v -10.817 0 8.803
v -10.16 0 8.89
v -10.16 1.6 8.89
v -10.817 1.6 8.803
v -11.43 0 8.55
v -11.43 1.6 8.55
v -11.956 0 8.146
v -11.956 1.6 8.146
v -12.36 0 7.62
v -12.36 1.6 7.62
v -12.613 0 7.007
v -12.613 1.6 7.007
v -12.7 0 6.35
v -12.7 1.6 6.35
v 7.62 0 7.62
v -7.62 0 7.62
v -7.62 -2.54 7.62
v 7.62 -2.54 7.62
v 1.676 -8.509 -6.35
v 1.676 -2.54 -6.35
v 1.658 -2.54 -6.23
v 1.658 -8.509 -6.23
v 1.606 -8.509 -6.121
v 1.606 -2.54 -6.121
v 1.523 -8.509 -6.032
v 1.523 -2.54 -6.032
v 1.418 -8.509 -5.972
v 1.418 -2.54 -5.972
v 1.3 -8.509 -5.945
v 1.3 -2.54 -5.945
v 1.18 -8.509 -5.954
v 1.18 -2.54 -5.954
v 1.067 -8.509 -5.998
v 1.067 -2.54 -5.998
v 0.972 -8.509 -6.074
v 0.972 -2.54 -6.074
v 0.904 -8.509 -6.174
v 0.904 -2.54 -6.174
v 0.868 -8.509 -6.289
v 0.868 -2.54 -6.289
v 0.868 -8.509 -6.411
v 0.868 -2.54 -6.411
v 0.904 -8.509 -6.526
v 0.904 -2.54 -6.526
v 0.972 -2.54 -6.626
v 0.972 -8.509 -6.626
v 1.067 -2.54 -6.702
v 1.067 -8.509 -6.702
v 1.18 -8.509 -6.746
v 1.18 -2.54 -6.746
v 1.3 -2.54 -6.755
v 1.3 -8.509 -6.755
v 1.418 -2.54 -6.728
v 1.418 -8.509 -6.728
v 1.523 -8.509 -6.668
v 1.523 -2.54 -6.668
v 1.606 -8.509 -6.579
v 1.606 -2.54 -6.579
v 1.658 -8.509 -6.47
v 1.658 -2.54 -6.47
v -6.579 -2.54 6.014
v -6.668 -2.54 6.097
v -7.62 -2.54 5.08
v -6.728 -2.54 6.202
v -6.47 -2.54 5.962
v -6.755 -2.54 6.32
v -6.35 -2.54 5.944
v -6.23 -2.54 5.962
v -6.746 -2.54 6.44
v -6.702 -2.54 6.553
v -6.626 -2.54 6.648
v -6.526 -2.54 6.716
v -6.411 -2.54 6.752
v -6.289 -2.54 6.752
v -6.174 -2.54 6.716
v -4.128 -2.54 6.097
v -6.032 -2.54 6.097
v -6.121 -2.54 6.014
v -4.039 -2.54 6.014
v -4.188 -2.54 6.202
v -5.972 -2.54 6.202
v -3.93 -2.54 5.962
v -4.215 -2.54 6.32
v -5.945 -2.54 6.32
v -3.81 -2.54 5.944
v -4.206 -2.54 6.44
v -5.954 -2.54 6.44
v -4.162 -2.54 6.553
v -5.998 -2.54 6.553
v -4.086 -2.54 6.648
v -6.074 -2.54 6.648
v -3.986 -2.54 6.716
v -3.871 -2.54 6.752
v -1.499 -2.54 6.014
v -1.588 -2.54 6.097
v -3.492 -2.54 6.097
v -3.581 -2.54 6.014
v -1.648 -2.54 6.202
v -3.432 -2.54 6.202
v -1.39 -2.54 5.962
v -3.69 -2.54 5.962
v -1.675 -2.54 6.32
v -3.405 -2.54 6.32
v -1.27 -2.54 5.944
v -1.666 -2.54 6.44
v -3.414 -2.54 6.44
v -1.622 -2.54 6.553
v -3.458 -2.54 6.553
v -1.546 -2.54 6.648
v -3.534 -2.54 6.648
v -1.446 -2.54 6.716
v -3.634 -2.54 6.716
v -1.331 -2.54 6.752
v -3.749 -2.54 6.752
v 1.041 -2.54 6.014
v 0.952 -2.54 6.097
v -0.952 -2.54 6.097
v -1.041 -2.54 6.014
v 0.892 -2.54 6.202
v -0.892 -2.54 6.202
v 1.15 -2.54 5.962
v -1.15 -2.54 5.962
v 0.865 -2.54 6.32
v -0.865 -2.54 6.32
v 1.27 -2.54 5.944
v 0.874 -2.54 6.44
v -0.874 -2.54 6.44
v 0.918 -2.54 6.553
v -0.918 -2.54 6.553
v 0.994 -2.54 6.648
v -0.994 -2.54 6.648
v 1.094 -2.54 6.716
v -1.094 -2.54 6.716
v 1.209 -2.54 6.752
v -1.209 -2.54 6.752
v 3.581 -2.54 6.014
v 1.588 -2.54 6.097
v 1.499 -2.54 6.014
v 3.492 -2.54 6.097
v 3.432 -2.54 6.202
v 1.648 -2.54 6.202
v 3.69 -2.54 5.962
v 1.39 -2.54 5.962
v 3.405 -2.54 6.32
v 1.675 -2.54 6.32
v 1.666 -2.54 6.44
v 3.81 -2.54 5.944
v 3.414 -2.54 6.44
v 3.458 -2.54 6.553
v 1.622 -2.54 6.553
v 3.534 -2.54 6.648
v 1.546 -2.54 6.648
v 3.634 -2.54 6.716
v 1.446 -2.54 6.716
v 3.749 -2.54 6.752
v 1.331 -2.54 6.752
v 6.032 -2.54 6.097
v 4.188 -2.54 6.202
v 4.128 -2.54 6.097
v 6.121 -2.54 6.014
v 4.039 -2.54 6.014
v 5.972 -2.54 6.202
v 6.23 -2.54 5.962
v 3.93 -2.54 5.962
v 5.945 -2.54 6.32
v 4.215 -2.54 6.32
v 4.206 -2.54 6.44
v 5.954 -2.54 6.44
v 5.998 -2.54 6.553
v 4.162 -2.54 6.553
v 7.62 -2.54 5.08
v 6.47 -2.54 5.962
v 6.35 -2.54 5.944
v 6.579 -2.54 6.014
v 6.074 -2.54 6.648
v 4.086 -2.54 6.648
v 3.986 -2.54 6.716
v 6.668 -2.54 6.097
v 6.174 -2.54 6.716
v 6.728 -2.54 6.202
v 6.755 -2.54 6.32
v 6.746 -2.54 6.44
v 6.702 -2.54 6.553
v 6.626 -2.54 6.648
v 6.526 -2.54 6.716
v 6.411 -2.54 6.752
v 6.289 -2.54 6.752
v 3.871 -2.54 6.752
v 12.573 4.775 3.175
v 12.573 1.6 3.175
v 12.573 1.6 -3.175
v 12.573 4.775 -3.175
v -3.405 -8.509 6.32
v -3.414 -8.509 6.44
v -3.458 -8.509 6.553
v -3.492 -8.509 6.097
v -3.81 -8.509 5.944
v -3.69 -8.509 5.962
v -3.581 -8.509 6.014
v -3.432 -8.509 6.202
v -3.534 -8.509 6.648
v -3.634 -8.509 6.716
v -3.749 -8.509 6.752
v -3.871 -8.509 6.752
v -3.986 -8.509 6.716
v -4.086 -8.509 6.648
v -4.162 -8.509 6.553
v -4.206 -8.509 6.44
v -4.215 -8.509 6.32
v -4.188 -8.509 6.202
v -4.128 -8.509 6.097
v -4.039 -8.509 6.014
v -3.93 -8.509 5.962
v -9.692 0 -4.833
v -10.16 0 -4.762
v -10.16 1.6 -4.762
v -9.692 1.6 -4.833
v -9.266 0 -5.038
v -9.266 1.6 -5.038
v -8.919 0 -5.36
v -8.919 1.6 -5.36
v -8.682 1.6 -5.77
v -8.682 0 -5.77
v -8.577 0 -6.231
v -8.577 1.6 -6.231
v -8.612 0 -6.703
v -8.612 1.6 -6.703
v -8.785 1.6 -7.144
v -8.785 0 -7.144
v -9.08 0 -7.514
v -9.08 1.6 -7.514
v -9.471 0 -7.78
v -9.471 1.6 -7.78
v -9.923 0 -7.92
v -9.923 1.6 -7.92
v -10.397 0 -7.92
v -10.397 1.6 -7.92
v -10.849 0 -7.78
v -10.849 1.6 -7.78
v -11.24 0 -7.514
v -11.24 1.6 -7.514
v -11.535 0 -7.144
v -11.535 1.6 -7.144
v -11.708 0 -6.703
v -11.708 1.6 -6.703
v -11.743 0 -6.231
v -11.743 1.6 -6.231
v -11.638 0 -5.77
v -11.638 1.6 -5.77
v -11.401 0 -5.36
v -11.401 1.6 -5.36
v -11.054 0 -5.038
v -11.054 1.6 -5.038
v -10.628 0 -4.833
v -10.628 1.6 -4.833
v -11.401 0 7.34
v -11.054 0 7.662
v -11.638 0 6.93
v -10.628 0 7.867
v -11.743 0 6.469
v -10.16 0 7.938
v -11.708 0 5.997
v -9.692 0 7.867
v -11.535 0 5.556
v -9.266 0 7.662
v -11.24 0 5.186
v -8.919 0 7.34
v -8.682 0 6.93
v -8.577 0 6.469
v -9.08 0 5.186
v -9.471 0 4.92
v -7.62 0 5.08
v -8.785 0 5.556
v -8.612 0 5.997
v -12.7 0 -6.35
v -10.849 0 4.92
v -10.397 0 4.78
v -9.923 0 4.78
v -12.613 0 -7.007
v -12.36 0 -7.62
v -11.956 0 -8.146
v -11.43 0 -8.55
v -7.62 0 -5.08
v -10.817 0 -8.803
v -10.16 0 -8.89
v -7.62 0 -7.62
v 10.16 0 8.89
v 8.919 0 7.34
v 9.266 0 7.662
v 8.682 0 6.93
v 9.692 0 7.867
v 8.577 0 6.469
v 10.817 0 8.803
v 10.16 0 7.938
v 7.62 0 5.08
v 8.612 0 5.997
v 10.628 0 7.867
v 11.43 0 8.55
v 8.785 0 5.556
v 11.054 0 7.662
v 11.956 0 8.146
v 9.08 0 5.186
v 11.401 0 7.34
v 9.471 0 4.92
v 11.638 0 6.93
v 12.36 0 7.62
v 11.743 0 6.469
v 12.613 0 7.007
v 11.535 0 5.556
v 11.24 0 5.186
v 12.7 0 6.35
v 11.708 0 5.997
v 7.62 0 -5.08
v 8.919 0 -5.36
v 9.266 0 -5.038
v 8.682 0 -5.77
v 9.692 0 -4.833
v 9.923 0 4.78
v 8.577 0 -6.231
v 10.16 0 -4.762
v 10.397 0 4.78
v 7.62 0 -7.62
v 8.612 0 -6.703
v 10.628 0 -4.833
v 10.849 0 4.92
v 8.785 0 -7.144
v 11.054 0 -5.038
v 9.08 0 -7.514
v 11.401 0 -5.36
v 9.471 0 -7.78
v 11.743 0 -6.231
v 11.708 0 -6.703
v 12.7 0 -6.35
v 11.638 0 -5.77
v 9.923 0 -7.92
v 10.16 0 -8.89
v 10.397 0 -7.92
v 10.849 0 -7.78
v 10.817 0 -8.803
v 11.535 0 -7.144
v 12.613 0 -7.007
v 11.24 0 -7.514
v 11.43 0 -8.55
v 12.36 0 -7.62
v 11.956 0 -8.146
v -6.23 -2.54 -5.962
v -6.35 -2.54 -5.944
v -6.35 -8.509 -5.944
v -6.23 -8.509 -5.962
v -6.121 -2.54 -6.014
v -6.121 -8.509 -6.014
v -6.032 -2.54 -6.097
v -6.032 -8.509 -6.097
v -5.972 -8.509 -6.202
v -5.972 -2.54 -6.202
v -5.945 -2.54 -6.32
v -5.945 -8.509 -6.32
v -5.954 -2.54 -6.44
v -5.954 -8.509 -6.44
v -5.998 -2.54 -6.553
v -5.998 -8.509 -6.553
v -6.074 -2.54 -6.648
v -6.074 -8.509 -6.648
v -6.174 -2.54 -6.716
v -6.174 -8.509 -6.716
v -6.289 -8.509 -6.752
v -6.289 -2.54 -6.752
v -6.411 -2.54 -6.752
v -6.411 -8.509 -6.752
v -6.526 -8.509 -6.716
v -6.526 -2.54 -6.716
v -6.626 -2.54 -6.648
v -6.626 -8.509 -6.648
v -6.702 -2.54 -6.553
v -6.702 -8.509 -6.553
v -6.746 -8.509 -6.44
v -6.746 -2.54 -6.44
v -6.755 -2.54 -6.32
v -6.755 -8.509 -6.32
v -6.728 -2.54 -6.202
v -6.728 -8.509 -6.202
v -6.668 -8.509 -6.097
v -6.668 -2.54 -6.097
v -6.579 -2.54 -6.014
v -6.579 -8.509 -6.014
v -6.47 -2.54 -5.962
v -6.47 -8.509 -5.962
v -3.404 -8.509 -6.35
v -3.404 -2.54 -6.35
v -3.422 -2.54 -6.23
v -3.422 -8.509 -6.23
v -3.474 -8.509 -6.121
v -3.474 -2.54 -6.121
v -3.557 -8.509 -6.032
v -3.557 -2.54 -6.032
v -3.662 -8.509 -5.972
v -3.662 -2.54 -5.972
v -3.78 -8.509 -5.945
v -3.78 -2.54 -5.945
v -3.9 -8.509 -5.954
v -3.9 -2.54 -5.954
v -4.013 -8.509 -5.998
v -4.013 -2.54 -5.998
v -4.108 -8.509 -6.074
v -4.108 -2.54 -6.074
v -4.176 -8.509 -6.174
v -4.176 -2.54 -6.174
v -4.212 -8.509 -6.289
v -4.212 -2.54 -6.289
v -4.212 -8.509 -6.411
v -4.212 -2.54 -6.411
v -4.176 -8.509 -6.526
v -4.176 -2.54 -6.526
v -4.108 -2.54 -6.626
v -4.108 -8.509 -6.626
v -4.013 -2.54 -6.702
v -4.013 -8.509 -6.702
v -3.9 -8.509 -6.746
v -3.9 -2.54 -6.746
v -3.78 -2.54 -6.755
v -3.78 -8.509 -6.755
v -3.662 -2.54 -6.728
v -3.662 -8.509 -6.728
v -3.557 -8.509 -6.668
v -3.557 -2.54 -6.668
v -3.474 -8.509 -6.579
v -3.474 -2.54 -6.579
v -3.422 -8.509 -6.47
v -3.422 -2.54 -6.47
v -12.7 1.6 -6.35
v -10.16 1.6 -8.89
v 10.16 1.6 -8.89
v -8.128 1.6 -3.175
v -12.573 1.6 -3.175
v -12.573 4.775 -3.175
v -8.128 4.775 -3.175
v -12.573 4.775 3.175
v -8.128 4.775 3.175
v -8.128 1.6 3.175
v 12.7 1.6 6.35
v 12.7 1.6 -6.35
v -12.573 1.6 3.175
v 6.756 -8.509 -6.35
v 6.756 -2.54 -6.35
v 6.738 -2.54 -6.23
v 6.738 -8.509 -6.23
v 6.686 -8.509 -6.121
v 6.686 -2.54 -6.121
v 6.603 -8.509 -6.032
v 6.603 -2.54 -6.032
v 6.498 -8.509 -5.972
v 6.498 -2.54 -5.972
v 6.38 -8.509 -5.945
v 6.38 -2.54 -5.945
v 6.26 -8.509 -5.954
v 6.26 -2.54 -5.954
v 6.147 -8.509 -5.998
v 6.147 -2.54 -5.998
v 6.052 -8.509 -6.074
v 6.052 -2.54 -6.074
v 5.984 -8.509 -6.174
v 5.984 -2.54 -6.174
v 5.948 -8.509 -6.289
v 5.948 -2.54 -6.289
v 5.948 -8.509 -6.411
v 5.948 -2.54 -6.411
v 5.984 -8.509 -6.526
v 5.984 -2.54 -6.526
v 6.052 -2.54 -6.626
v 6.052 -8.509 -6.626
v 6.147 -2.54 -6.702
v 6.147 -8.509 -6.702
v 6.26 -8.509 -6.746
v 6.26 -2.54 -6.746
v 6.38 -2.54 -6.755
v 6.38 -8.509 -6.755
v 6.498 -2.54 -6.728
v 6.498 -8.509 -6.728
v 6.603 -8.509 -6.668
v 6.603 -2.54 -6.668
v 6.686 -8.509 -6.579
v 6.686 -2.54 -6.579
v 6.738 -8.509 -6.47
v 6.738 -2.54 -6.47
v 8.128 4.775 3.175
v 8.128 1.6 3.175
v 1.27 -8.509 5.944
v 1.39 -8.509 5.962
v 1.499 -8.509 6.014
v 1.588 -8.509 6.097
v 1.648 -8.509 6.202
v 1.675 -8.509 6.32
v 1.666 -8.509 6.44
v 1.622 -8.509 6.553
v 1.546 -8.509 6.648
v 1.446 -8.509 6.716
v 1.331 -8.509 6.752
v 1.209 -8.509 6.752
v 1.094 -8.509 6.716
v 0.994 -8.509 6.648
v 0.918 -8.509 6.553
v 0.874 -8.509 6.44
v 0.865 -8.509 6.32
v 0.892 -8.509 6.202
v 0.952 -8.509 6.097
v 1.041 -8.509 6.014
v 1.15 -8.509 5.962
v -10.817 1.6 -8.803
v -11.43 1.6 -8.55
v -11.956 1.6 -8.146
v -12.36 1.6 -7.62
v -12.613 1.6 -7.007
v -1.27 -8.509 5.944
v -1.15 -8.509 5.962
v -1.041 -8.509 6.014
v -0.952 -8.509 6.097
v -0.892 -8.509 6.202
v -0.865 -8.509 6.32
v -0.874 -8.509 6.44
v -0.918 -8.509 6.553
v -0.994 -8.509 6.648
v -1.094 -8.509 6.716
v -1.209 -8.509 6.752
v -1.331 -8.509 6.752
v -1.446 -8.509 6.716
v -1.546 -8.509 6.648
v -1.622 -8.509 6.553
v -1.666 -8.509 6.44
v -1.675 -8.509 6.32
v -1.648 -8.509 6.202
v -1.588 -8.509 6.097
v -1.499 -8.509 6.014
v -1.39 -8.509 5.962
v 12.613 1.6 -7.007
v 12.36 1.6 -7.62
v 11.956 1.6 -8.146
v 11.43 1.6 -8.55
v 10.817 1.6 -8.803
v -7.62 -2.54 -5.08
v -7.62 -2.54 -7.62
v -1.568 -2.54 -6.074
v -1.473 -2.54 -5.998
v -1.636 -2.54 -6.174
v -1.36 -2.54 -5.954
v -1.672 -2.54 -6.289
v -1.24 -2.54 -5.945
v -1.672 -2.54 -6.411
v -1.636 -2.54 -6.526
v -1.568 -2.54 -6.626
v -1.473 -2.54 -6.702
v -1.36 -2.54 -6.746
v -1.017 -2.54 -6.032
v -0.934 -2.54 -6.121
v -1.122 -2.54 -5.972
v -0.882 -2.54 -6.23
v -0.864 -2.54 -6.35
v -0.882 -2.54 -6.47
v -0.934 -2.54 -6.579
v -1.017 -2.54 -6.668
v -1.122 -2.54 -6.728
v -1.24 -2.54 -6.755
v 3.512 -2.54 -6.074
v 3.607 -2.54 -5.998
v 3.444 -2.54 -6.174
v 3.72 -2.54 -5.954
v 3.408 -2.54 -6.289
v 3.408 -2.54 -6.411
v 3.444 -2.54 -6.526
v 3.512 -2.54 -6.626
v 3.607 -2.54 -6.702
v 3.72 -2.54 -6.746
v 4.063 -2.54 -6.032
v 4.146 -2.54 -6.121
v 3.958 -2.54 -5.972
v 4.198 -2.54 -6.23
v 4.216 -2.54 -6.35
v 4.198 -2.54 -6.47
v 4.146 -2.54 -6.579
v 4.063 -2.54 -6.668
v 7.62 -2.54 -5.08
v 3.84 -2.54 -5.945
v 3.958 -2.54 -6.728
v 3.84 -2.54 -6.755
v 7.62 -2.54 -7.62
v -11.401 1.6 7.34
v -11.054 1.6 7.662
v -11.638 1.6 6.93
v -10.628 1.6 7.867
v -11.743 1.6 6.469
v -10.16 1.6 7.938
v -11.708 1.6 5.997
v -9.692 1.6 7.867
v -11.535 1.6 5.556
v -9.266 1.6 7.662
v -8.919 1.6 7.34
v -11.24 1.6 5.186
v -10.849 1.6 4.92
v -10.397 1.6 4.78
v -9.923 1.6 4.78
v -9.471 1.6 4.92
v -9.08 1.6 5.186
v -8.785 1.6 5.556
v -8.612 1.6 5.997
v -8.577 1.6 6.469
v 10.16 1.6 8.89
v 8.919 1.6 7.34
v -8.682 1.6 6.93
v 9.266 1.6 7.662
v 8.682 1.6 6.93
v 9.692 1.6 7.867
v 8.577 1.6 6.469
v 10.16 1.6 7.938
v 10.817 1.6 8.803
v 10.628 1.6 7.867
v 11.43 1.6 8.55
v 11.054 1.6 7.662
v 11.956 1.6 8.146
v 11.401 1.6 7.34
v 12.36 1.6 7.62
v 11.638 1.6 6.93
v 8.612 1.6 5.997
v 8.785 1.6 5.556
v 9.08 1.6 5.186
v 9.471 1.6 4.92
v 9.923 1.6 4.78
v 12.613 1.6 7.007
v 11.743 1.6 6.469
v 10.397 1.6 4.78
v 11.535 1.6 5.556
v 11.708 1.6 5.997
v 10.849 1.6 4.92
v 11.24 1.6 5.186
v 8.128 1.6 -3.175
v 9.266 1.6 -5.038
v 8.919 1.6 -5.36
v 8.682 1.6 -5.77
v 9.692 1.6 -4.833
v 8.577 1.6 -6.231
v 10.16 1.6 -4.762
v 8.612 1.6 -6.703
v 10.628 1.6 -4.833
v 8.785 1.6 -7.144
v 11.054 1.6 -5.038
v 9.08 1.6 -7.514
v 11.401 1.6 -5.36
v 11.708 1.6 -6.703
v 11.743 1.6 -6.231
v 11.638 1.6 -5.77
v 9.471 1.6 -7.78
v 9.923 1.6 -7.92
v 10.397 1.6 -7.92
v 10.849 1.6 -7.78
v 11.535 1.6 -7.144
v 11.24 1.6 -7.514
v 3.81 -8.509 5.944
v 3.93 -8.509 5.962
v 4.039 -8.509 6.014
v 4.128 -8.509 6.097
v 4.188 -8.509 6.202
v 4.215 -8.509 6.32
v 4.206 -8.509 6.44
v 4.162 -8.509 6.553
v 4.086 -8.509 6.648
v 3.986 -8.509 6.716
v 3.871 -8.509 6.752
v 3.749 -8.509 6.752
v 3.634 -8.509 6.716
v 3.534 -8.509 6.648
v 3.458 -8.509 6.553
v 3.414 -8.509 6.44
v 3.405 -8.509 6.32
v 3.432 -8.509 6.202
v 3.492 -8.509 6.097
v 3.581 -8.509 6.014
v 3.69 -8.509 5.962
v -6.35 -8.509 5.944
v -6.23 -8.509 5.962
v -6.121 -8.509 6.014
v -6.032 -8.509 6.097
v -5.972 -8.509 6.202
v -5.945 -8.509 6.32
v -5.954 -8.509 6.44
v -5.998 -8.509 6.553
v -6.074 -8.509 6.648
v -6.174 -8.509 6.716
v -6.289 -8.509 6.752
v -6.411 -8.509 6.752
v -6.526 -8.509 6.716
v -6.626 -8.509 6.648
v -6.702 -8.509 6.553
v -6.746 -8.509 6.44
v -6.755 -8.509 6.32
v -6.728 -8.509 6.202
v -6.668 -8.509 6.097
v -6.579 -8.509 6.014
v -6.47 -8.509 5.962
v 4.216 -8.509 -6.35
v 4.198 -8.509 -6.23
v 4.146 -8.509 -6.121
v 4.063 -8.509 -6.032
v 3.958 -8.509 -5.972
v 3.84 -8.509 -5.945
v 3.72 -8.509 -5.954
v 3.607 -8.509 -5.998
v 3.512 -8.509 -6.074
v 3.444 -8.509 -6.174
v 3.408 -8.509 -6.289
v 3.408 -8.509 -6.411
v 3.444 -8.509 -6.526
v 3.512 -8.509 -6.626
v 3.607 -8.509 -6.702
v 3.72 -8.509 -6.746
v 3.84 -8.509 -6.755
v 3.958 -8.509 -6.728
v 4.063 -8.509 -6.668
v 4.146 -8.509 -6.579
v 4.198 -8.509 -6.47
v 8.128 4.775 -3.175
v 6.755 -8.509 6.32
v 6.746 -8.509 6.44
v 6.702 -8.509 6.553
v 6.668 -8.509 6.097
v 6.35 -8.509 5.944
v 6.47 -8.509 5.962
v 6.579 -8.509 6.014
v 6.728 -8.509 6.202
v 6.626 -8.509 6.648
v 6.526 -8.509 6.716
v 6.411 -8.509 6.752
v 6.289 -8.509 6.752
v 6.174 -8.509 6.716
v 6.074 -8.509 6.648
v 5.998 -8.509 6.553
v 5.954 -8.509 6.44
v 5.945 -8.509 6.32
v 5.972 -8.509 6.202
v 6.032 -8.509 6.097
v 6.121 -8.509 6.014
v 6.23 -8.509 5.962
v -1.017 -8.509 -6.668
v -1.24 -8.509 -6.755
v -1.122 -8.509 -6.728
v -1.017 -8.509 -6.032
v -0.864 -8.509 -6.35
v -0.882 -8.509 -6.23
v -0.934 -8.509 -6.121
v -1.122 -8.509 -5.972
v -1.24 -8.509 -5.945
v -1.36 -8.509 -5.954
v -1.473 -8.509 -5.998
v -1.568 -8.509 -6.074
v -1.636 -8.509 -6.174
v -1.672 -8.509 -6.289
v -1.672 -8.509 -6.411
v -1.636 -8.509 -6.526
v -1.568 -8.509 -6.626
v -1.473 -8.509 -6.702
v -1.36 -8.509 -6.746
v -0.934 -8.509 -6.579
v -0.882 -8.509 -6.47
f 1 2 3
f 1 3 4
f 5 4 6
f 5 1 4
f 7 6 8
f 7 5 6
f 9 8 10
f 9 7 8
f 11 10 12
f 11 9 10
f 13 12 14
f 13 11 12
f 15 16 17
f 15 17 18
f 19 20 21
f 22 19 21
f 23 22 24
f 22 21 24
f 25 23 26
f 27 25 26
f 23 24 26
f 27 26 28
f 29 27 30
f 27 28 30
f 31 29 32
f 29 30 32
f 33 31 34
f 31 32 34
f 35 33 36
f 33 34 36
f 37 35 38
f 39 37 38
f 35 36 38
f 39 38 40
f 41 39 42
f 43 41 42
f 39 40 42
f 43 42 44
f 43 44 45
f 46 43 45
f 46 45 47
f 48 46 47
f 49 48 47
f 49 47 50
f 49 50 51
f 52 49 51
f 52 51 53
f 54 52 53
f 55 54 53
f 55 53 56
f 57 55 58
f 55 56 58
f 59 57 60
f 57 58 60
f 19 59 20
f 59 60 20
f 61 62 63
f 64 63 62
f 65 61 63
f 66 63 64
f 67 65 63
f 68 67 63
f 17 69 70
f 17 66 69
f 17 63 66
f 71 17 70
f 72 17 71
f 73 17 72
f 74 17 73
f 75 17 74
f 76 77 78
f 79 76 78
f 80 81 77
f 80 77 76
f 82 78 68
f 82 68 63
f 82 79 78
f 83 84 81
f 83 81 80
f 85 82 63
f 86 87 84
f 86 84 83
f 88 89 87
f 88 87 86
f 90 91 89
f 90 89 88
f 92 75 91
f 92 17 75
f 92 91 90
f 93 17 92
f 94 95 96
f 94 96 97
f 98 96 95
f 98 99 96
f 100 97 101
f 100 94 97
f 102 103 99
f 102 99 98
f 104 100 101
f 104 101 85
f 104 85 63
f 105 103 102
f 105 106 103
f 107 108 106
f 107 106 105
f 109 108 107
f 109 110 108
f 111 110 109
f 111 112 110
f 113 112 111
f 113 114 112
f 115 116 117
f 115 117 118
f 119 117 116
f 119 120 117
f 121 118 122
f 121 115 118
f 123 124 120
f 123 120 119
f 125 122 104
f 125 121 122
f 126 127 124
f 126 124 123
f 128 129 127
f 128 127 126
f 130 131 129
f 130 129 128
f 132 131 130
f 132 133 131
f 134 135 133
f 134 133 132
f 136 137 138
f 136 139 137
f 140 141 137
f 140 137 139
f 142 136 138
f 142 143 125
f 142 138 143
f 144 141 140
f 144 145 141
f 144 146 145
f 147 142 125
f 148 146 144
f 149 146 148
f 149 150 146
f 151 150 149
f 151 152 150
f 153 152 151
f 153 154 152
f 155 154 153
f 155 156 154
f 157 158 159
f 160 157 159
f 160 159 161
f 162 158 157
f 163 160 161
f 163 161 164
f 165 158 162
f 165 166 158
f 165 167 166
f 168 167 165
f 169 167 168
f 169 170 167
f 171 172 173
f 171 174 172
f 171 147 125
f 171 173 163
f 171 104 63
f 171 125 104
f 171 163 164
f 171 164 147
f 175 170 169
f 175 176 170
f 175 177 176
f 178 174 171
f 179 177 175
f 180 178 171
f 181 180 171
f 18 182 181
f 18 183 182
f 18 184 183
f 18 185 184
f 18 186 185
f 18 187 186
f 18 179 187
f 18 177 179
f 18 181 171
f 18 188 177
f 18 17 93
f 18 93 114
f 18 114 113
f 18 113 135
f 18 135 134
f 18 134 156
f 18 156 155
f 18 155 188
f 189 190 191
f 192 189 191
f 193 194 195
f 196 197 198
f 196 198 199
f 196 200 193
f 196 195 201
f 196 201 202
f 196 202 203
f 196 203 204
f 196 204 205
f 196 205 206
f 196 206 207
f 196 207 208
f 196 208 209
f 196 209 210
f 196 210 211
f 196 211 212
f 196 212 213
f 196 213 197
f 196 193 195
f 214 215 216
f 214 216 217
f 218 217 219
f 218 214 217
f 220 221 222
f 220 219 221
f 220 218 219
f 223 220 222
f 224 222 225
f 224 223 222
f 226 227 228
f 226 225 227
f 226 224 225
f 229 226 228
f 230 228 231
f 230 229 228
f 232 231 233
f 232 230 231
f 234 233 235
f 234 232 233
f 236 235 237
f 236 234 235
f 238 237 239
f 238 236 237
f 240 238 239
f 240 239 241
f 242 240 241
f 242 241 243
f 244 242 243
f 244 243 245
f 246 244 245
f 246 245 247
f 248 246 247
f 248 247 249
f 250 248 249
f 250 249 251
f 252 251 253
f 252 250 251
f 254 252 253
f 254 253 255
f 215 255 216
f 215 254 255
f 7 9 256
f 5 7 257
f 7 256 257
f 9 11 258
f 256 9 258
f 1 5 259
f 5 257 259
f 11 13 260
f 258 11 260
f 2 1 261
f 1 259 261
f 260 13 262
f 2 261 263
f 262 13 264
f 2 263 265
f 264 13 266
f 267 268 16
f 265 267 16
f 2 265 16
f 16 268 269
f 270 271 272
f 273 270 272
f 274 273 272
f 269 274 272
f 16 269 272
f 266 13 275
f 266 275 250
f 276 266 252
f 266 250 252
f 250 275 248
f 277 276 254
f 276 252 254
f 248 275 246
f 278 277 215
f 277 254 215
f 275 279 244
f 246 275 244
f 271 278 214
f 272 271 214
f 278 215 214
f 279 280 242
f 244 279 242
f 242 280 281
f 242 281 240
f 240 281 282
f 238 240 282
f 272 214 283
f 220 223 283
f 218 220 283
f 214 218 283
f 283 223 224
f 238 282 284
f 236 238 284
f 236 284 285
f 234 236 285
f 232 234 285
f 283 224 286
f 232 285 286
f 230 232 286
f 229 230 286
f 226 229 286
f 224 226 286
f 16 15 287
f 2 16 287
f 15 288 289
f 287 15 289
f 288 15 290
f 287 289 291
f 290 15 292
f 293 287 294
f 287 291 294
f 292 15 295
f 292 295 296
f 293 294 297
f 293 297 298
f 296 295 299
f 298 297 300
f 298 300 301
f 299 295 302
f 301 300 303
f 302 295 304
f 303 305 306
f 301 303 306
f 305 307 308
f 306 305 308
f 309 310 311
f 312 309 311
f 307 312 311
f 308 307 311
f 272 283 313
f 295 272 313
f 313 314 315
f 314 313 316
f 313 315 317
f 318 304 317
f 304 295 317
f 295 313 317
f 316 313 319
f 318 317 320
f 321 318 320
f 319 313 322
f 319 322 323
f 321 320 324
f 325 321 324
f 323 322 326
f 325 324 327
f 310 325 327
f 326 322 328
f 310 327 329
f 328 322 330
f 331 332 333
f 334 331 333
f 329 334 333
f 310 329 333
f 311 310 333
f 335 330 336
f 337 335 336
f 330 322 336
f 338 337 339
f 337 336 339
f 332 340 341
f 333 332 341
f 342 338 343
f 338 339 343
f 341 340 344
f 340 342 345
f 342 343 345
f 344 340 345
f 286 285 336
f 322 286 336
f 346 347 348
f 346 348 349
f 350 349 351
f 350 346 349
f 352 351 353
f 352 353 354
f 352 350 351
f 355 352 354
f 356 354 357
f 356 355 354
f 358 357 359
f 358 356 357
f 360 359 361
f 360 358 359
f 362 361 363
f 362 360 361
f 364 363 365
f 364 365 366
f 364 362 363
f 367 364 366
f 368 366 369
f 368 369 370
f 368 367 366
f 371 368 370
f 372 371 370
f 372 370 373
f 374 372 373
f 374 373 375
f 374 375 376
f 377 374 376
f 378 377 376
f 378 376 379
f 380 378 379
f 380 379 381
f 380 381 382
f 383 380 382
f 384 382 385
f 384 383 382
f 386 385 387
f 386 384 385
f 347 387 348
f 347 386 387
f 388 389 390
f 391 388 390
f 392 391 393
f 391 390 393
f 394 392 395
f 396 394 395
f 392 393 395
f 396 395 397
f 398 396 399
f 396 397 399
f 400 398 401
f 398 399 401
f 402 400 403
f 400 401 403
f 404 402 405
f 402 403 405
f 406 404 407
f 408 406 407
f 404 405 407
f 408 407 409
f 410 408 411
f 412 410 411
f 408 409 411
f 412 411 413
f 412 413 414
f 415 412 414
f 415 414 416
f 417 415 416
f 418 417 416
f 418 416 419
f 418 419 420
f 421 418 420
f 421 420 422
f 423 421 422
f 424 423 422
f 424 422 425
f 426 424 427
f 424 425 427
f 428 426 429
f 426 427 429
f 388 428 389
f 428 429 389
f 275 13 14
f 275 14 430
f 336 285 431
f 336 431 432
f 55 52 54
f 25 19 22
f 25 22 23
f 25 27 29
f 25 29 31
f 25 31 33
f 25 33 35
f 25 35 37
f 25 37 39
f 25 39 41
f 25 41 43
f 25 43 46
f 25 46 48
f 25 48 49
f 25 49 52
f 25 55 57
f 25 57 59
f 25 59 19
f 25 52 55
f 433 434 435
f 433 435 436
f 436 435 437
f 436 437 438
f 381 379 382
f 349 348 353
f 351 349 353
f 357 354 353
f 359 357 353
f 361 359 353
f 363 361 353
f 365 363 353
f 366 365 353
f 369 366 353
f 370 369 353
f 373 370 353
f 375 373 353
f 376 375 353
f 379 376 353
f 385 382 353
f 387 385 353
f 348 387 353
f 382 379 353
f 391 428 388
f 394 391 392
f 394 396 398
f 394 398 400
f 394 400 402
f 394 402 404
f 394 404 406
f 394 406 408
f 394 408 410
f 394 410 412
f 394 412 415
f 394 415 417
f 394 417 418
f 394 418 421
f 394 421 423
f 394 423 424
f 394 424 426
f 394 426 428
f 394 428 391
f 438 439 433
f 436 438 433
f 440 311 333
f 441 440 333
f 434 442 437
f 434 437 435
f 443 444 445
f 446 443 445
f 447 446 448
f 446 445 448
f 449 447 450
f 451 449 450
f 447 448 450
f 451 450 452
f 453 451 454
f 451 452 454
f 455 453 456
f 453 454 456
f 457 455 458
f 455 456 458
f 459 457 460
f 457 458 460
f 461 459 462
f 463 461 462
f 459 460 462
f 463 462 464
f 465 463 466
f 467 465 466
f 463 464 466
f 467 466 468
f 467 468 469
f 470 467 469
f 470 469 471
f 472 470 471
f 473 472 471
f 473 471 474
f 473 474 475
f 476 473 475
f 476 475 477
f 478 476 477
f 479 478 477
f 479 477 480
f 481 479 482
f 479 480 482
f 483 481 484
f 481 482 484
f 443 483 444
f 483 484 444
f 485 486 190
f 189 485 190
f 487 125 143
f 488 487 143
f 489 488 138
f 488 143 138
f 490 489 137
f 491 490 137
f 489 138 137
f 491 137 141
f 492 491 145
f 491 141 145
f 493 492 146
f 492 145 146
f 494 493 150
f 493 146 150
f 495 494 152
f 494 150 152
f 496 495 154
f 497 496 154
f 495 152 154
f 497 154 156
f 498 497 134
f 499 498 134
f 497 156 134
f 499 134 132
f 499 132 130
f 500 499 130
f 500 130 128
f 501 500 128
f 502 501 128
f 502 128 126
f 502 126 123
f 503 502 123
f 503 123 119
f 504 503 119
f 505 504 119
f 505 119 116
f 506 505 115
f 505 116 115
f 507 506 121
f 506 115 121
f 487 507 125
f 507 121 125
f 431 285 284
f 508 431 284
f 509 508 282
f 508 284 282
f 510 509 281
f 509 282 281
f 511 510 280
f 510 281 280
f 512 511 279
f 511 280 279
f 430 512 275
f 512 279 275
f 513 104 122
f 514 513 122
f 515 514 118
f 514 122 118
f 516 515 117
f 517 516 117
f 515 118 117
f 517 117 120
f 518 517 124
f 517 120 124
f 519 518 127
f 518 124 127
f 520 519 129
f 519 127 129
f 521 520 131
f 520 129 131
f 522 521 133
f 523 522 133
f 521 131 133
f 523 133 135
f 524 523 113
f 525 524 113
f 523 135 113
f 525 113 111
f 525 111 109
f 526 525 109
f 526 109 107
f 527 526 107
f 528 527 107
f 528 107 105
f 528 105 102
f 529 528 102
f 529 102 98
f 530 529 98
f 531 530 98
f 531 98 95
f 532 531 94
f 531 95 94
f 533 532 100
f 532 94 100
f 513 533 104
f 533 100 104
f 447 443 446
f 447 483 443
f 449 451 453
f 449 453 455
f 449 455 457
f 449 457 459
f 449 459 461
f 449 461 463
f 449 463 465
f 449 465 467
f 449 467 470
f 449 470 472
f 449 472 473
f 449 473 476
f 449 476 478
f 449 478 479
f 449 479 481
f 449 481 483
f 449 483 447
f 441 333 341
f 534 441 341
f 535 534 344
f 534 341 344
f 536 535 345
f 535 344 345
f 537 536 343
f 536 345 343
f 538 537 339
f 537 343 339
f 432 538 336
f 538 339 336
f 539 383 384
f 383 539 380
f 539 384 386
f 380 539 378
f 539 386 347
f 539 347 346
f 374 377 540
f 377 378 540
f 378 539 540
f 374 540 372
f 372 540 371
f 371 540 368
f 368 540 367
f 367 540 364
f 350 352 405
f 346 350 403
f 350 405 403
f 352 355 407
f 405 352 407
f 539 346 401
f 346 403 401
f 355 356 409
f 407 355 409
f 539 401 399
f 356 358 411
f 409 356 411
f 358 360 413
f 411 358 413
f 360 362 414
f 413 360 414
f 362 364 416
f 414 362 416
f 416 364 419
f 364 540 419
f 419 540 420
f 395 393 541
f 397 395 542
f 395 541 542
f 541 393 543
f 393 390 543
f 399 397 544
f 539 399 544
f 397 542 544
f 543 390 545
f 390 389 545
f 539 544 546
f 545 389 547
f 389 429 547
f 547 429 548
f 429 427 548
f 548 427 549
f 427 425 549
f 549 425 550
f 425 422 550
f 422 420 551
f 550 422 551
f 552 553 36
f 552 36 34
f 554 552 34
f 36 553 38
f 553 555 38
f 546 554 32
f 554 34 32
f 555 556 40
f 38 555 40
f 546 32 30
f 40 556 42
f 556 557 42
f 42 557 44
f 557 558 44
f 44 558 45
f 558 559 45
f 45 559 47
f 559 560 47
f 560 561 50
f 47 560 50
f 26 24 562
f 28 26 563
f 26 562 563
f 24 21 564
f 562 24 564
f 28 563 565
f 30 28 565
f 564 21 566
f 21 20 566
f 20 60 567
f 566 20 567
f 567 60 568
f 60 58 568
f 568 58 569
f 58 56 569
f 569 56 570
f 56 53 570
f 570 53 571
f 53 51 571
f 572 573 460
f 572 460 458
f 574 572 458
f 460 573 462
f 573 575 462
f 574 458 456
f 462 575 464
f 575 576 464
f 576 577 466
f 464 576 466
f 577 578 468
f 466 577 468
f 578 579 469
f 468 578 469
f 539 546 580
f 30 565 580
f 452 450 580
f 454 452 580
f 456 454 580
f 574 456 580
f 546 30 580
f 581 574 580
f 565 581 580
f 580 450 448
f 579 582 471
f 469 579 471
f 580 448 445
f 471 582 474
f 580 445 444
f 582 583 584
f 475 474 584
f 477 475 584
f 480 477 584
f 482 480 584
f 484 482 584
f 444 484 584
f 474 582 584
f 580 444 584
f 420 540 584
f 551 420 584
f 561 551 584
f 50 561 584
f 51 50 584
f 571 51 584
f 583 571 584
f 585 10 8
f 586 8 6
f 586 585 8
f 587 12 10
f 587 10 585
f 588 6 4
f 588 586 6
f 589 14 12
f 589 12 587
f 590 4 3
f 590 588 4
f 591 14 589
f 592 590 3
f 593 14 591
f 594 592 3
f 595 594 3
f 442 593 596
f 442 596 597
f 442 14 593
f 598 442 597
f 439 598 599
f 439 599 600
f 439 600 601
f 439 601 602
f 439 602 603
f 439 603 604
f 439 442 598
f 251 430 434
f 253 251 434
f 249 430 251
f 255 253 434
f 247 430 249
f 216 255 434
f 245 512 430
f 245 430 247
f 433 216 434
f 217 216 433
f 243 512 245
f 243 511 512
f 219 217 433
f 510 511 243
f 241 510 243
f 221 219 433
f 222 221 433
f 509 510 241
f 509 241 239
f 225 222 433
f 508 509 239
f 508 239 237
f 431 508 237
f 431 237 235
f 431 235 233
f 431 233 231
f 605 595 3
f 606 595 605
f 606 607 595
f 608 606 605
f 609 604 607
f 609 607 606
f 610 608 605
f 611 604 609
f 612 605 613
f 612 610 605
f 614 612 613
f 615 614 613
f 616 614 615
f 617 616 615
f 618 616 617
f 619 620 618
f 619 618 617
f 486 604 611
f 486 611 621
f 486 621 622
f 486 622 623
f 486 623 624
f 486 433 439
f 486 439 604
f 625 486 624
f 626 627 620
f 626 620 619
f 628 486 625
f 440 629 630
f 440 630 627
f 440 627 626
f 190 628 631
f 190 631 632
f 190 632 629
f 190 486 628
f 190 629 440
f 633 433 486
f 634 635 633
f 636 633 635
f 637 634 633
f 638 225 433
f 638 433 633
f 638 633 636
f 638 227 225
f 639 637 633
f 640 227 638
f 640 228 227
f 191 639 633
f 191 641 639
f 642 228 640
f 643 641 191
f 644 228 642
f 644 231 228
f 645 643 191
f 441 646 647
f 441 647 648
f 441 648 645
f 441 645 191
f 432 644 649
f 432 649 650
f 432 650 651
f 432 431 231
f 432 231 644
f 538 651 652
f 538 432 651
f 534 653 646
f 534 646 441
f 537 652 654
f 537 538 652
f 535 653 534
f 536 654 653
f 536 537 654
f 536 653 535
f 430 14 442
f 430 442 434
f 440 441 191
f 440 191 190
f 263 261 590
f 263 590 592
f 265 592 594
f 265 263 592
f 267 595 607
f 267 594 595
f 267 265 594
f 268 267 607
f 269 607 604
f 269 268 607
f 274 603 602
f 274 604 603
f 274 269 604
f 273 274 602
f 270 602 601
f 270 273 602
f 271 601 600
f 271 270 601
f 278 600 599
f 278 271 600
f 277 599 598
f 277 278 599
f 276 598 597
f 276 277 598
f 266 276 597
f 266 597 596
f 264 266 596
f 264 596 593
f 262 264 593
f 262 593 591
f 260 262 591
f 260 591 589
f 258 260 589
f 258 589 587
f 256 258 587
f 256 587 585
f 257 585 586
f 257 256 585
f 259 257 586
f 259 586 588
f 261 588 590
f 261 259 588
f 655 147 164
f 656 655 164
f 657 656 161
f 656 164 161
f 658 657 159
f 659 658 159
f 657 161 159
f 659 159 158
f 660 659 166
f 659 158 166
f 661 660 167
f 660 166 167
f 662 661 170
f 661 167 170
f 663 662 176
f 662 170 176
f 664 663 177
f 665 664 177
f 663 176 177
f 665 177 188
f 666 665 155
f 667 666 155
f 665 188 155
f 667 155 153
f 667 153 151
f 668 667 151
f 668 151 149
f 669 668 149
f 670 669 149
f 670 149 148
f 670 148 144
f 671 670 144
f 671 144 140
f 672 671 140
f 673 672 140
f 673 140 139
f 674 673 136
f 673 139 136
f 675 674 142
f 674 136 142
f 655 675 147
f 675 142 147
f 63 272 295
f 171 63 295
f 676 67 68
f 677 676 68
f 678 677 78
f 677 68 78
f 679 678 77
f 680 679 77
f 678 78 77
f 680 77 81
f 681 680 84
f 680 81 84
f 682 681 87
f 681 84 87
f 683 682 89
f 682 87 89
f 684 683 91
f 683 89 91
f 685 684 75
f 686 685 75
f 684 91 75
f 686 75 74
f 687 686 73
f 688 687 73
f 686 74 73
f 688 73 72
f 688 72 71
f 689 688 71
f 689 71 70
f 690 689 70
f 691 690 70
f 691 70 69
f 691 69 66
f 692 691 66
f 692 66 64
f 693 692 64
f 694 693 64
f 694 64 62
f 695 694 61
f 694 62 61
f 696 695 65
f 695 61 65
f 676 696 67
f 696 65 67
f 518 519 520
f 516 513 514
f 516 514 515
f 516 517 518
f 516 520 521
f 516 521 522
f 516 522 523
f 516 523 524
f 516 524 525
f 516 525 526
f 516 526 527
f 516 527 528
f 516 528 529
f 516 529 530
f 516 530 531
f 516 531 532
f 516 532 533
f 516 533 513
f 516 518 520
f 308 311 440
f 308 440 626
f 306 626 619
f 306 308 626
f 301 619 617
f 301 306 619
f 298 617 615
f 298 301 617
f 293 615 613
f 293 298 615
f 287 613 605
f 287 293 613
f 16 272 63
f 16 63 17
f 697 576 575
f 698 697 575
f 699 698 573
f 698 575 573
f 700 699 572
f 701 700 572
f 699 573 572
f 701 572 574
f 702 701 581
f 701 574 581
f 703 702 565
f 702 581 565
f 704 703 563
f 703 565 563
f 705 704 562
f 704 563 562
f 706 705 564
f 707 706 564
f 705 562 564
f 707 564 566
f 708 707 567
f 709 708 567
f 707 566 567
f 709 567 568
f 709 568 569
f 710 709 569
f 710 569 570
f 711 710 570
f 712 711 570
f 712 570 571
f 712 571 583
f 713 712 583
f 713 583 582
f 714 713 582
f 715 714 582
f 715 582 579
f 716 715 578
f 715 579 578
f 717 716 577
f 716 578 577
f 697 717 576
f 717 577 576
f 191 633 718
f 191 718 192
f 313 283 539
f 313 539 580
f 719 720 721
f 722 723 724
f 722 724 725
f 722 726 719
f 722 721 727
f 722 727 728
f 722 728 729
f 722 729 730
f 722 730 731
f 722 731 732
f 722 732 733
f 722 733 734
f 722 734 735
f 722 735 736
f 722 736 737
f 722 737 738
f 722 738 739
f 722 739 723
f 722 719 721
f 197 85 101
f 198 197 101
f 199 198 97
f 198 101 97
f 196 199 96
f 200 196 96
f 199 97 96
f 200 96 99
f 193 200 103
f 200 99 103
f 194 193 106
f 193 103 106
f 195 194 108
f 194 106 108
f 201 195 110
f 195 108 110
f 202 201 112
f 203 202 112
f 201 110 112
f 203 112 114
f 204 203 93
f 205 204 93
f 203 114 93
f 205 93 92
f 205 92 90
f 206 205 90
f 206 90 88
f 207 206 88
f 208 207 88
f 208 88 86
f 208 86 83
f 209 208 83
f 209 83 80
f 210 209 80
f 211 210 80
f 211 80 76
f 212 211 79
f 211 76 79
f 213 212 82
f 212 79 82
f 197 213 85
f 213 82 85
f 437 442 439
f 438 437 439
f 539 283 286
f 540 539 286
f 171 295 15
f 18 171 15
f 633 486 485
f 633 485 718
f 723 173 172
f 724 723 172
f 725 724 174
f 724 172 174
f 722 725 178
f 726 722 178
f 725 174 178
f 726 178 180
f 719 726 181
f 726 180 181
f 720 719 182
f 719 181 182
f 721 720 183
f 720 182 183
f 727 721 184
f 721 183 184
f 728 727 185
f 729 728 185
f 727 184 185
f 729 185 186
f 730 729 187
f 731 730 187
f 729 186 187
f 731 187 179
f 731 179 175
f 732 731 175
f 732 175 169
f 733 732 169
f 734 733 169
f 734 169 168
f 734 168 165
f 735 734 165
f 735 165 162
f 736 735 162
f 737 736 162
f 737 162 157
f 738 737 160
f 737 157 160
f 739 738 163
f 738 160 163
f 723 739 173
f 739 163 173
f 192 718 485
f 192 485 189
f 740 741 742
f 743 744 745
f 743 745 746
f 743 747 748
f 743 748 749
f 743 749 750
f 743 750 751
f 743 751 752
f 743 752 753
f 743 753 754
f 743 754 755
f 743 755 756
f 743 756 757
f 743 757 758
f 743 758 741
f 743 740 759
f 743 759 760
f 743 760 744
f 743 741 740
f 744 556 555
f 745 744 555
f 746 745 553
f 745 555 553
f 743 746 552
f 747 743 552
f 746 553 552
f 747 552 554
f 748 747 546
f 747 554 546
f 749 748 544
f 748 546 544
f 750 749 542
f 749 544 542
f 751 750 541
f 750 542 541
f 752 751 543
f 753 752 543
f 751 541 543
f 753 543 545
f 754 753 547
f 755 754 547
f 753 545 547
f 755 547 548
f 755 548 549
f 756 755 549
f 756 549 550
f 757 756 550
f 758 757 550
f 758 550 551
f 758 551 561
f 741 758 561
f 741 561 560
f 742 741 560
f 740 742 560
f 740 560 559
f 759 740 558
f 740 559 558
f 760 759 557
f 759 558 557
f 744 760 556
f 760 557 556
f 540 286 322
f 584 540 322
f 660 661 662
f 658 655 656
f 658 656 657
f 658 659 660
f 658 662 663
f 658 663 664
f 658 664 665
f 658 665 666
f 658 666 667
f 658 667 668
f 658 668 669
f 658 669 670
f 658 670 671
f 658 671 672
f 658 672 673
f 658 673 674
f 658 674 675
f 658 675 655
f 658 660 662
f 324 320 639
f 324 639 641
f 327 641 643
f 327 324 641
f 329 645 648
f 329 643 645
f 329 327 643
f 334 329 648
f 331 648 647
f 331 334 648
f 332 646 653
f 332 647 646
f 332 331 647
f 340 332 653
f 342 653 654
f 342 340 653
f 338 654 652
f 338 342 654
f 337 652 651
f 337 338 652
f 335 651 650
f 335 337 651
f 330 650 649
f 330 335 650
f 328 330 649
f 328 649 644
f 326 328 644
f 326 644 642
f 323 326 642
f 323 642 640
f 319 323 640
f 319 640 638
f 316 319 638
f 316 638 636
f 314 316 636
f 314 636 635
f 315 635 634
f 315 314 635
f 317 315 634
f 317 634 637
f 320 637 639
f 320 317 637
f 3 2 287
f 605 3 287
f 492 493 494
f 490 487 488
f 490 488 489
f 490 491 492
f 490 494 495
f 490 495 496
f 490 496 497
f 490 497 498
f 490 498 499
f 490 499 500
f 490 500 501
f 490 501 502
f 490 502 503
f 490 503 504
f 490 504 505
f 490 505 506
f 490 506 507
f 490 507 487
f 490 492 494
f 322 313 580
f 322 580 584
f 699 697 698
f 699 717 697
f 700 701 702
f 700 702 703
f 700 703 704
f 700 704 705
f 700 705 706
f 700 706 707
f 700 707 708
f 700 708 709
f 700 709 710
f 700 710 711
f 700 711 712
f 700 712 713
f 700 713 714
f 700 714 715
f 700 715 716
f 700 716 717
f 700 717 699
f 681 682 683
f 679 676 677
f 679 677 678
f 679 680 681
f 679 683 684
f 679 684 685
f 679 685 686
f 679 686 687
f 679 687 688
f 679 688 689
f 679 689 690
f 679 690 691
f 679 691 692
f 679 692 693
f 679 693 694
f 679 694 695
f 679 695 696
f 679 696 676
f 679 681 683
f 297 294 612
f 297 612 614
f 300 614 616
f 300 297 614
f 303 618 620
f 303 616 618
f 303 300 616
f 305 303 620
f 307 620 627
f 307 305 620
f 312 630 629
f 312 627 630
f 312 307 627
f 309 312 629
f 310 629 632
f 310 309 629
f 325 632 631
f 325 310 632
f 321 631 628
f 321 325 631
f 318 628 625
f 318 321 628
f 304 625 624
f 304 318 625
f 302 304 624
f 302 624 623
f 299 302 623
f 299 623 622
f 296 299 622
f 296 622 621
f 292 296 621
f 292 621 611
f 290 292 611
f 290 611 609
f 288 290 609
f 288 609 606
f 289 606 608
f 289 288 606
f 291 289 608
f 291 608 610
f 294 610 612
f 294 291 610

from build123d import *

# Parameters (mm, degrees)
SKETCH1_W               = 25.4
SKETCH1_H               = 17.78
BOSS_EXTRUDE1_DEPTH     = 1.6002
CUT_EXTRUDE1_DEPTH      = 16.584695699
CUT_EXTRUDE1_DEPTH_BACK = 16.584695699
SKETCH2_R               = 1.5875
SKETCH3_W               = 15.24
SKETCH3_H               = 2.54
BOSS_EXTRUDE2_DEPTH     = 2.54
SKETCH4_R               = 0.4064
BOSS_EXTRUDE3_DEPTH     = 5.969
LPATTERN1_COUNT         = 6
LPATTERN1_PITCH         = 2.54
MIRROR1_COPY_1_SKETCH_R = 0.4064
MIRROR1_COPY_1_DEPTH    = 5.969
MIRROR1_COPY_2_SKETCH_R = 0.4064
MIRROR1_COPY_2_DEPTH    = 5.969
MIRROR1_COPY_3_SKETCH_R = 0.4064
MIRROR1_COPY_3_DEPTH    = 5.969
MIRROR1_COPY_4_SKETCH_R = 0.4064
MIRROR1_COPY_4_DEPTH    = 5.969
MIRROR1_COPY_5_SKETCH_R = 0.4064
MIRROR1_COPY_5_DEPTH    = 5.969
SKETCH5_W               = 4.445
SKETCH5_H               = 6.35
BOSS_EXTRUDE4_DEPTH     = 3.175


with BuildPart() as part:
    # Sketch1 → Boss-Extrude1 (new body)
    with BuildSketch(Plane(origin=(0, 0, 0), x_dir=(1, 0, 0), z_dir=(0, 1, 0))):
        Rectangle(SKETCH1_W, SKETCH1_H)
    extrude(amount=BOSS_EXTRUDE1_DEPTH)

    # Sketch2 → Cut-Extrude1 (cut, two sides: drawn at the far end of the back side and taken through both)
    with BuildSketch(Plane(origin=(0, 1.6002, 0), x_dir=(1, 0, 0), z_dir=(0, 1, 0)).offset(-CUT_EXTRUDE1_DEPTH_BACK)):
        with Locations(Location((-10.16, 6.35, 0), (0, 0, 270))):
            Circle(SKETCH2_R)
        with Locations(Location((10.16, 6.35, 0), (0, 0, 270))):
            Circle(SKETCH2_R)
        with Locations(Location((10.16, -6.35, 0), (0, 0, 270))):
            Circle(SKETCH2_R)
        with Locations(Location((-10.16, -6.35, 0), (0, 0, 270))):
            Circle(SKETCH2_R)
        with BuildLine():
            Line((-12.7, 6.35), (-12.7, 8.89))
            Line((-12.7, 8.89), (-10.16, 8.89))
            ThreePointArc((-10.16, 8.89), (-11.956051224, 8.146051224), (-12.7, 6.35))
        make_face()
        with BuildLine():
            Line((10.16, 8.89), (12.7, 8.89))
            Line((12.7, 8.89), (12.7, 6.35))
            ThreePointArc((12.7, 6.35), (11.956051224, 8.146051224), (10.16, 8.89))
        make_face()
        with BuildLine():
            Line((10.16, -8.89), (12.7, -8.89))
            Line((12.7, -8.89), (12.7, -6.35))
            ThreePointArc((12.7, -6.35), (11.956051224, -8.146051224), (10.16, -8.89))
        make_face()
        with BuildLine():
            Line((-12.7, -6.35), (-12.7, -8.89))
            Line((-12.7, -8.89), (-10.16, -8.89))
            ThreePointArc((-10.16, -8.89), (-11.956051224, -8.146051224), (-12.7, -6.35))
        make_face()
    extrude(amount=CUT_EXTRUDE1_DEPTH + CUT_EXTRUDE1_DEPTH_BACK, mode=Mode.SUBTRACT)

    # Sketch3 → Boss-Extrude2 (add)
    with BuildSketch(Plane.XZ):
        with Locations((0, 6.35)):
            Rectangle(SKETCH3_W, SKETCH3_H)
    boss_extrude2 = extrude(amount=BOSS_EXTRUDE2_DEPTH)

    # Sketch4 → Boss-Extrude3 (add)
    with BuildSketch(Plane.XZ.offset(2.54)):
        with Locations(Location((-6.35, 6.35, 0), (0, 0, 270))):
            Circle(SKETCH4_R)
    boss_extrude3 = extrude(amount=BOSS_EXTRUDE3_DEPTH)

    # LPattern1: Boss-Extrude3 ×6
    with Locations(*[(i * LPATTERN1_PITCH, 0, 0) for i in range(1, LPATTERN1_COUNT)]):
        add(boss_extrude3)

    # Mirror1: Boss-Extrude2, Boss-Extrude3 across plane
    add(boss_extrude2.mirror(Plane.XY))
    add(boss_extrude3.mirror(Plane.XY))

    # Mirror1 copy 1 sketch → Mirror1 copy 1 (add)
    with BuildSketch(Plane(origin=(2.54, -2.54, 0), x_dir=(1, 0, 0), z_dir=(0, -1, 0))):
        with Locations((-6.35, -6.35)):
            Circle(MIRROR1_COPY_1_SKETCH_R)
    extrude(amount=MIRROR1_COPY_1_DEPTH)

    # Mirror1 copy 2 sketch → Mirror1 copy 2 (add)
    with BuildSketch(Plane(origin=(5.08, -2.54, 0), x_dir=(1, 0, 0), z_dir=(0, -1, 0))):
        with Locations((-6.35, -6.35)):
            Circle(MIRROR1_COPY_2_SKETCH_R)
    extrude(amount=MIRROR1_COPY_2_DEPTH)

    # Mirror1 copy 3 sketch → Mirror1 copy 3 (add)
    with BuildSketch(Plane(origin=(7.62, -2.54, 0), x_dir=(1, 0, 0), z_dir=(0, -1, 0))):
        with Locations((-6.35, -6.35)):
            Circle(MIRROR1_COPY_3_SKETCH_R)
    extrude(amount=MIRROR1_COPY_3_DEPTH)

    # Mirror1 copy 4 sketch → Mirror1 copy 4 (add)
    with BuildSketch(Plane(origin=(10.16, -2.54, 0), x_dir=(1, 0, 0), z_dir=(0, -1, 0))):
        with Locations((-6.35, -6.35)):
            Circle(MIRROR1_COPY_4_SKETCH_R)
    extrude(amount=MIRROR1_COPY_4_DEPTH)

    # Mirror1 copy 5 sketch → Mirror1 copy 5 (add)
    with BuildSketch(Plane(origin=(12.7, -2.54, 0), x_dir=(1, 0, 0), z_dir=(0, -1, 0))):
        with Locations((-6.35, -6.35)):
            Circle(MIRROR1_COPY_5_SKETCH_R)
    extrude(amount=MIRROR1_COPY_5_DEPTH)

    # Sketch5 → Boss-Extrude4 (add)
    with BuildSketch(Plane(origin=(0, 1.6002, 0), x_dir=(1, 0, 0), z_dir=(0, 1, 0))):
        with Locations((-10.3505, 0)):
            Rectangle(SKETCH5_W, SKETCH5_H)
        with Locations((10.3505, 0)):
            Rectangle(SKETCH5_W, SKETCH5_H)
    extrude(amount=BOSS_EXTRUDE4_DEPTH)


solid = part.part
